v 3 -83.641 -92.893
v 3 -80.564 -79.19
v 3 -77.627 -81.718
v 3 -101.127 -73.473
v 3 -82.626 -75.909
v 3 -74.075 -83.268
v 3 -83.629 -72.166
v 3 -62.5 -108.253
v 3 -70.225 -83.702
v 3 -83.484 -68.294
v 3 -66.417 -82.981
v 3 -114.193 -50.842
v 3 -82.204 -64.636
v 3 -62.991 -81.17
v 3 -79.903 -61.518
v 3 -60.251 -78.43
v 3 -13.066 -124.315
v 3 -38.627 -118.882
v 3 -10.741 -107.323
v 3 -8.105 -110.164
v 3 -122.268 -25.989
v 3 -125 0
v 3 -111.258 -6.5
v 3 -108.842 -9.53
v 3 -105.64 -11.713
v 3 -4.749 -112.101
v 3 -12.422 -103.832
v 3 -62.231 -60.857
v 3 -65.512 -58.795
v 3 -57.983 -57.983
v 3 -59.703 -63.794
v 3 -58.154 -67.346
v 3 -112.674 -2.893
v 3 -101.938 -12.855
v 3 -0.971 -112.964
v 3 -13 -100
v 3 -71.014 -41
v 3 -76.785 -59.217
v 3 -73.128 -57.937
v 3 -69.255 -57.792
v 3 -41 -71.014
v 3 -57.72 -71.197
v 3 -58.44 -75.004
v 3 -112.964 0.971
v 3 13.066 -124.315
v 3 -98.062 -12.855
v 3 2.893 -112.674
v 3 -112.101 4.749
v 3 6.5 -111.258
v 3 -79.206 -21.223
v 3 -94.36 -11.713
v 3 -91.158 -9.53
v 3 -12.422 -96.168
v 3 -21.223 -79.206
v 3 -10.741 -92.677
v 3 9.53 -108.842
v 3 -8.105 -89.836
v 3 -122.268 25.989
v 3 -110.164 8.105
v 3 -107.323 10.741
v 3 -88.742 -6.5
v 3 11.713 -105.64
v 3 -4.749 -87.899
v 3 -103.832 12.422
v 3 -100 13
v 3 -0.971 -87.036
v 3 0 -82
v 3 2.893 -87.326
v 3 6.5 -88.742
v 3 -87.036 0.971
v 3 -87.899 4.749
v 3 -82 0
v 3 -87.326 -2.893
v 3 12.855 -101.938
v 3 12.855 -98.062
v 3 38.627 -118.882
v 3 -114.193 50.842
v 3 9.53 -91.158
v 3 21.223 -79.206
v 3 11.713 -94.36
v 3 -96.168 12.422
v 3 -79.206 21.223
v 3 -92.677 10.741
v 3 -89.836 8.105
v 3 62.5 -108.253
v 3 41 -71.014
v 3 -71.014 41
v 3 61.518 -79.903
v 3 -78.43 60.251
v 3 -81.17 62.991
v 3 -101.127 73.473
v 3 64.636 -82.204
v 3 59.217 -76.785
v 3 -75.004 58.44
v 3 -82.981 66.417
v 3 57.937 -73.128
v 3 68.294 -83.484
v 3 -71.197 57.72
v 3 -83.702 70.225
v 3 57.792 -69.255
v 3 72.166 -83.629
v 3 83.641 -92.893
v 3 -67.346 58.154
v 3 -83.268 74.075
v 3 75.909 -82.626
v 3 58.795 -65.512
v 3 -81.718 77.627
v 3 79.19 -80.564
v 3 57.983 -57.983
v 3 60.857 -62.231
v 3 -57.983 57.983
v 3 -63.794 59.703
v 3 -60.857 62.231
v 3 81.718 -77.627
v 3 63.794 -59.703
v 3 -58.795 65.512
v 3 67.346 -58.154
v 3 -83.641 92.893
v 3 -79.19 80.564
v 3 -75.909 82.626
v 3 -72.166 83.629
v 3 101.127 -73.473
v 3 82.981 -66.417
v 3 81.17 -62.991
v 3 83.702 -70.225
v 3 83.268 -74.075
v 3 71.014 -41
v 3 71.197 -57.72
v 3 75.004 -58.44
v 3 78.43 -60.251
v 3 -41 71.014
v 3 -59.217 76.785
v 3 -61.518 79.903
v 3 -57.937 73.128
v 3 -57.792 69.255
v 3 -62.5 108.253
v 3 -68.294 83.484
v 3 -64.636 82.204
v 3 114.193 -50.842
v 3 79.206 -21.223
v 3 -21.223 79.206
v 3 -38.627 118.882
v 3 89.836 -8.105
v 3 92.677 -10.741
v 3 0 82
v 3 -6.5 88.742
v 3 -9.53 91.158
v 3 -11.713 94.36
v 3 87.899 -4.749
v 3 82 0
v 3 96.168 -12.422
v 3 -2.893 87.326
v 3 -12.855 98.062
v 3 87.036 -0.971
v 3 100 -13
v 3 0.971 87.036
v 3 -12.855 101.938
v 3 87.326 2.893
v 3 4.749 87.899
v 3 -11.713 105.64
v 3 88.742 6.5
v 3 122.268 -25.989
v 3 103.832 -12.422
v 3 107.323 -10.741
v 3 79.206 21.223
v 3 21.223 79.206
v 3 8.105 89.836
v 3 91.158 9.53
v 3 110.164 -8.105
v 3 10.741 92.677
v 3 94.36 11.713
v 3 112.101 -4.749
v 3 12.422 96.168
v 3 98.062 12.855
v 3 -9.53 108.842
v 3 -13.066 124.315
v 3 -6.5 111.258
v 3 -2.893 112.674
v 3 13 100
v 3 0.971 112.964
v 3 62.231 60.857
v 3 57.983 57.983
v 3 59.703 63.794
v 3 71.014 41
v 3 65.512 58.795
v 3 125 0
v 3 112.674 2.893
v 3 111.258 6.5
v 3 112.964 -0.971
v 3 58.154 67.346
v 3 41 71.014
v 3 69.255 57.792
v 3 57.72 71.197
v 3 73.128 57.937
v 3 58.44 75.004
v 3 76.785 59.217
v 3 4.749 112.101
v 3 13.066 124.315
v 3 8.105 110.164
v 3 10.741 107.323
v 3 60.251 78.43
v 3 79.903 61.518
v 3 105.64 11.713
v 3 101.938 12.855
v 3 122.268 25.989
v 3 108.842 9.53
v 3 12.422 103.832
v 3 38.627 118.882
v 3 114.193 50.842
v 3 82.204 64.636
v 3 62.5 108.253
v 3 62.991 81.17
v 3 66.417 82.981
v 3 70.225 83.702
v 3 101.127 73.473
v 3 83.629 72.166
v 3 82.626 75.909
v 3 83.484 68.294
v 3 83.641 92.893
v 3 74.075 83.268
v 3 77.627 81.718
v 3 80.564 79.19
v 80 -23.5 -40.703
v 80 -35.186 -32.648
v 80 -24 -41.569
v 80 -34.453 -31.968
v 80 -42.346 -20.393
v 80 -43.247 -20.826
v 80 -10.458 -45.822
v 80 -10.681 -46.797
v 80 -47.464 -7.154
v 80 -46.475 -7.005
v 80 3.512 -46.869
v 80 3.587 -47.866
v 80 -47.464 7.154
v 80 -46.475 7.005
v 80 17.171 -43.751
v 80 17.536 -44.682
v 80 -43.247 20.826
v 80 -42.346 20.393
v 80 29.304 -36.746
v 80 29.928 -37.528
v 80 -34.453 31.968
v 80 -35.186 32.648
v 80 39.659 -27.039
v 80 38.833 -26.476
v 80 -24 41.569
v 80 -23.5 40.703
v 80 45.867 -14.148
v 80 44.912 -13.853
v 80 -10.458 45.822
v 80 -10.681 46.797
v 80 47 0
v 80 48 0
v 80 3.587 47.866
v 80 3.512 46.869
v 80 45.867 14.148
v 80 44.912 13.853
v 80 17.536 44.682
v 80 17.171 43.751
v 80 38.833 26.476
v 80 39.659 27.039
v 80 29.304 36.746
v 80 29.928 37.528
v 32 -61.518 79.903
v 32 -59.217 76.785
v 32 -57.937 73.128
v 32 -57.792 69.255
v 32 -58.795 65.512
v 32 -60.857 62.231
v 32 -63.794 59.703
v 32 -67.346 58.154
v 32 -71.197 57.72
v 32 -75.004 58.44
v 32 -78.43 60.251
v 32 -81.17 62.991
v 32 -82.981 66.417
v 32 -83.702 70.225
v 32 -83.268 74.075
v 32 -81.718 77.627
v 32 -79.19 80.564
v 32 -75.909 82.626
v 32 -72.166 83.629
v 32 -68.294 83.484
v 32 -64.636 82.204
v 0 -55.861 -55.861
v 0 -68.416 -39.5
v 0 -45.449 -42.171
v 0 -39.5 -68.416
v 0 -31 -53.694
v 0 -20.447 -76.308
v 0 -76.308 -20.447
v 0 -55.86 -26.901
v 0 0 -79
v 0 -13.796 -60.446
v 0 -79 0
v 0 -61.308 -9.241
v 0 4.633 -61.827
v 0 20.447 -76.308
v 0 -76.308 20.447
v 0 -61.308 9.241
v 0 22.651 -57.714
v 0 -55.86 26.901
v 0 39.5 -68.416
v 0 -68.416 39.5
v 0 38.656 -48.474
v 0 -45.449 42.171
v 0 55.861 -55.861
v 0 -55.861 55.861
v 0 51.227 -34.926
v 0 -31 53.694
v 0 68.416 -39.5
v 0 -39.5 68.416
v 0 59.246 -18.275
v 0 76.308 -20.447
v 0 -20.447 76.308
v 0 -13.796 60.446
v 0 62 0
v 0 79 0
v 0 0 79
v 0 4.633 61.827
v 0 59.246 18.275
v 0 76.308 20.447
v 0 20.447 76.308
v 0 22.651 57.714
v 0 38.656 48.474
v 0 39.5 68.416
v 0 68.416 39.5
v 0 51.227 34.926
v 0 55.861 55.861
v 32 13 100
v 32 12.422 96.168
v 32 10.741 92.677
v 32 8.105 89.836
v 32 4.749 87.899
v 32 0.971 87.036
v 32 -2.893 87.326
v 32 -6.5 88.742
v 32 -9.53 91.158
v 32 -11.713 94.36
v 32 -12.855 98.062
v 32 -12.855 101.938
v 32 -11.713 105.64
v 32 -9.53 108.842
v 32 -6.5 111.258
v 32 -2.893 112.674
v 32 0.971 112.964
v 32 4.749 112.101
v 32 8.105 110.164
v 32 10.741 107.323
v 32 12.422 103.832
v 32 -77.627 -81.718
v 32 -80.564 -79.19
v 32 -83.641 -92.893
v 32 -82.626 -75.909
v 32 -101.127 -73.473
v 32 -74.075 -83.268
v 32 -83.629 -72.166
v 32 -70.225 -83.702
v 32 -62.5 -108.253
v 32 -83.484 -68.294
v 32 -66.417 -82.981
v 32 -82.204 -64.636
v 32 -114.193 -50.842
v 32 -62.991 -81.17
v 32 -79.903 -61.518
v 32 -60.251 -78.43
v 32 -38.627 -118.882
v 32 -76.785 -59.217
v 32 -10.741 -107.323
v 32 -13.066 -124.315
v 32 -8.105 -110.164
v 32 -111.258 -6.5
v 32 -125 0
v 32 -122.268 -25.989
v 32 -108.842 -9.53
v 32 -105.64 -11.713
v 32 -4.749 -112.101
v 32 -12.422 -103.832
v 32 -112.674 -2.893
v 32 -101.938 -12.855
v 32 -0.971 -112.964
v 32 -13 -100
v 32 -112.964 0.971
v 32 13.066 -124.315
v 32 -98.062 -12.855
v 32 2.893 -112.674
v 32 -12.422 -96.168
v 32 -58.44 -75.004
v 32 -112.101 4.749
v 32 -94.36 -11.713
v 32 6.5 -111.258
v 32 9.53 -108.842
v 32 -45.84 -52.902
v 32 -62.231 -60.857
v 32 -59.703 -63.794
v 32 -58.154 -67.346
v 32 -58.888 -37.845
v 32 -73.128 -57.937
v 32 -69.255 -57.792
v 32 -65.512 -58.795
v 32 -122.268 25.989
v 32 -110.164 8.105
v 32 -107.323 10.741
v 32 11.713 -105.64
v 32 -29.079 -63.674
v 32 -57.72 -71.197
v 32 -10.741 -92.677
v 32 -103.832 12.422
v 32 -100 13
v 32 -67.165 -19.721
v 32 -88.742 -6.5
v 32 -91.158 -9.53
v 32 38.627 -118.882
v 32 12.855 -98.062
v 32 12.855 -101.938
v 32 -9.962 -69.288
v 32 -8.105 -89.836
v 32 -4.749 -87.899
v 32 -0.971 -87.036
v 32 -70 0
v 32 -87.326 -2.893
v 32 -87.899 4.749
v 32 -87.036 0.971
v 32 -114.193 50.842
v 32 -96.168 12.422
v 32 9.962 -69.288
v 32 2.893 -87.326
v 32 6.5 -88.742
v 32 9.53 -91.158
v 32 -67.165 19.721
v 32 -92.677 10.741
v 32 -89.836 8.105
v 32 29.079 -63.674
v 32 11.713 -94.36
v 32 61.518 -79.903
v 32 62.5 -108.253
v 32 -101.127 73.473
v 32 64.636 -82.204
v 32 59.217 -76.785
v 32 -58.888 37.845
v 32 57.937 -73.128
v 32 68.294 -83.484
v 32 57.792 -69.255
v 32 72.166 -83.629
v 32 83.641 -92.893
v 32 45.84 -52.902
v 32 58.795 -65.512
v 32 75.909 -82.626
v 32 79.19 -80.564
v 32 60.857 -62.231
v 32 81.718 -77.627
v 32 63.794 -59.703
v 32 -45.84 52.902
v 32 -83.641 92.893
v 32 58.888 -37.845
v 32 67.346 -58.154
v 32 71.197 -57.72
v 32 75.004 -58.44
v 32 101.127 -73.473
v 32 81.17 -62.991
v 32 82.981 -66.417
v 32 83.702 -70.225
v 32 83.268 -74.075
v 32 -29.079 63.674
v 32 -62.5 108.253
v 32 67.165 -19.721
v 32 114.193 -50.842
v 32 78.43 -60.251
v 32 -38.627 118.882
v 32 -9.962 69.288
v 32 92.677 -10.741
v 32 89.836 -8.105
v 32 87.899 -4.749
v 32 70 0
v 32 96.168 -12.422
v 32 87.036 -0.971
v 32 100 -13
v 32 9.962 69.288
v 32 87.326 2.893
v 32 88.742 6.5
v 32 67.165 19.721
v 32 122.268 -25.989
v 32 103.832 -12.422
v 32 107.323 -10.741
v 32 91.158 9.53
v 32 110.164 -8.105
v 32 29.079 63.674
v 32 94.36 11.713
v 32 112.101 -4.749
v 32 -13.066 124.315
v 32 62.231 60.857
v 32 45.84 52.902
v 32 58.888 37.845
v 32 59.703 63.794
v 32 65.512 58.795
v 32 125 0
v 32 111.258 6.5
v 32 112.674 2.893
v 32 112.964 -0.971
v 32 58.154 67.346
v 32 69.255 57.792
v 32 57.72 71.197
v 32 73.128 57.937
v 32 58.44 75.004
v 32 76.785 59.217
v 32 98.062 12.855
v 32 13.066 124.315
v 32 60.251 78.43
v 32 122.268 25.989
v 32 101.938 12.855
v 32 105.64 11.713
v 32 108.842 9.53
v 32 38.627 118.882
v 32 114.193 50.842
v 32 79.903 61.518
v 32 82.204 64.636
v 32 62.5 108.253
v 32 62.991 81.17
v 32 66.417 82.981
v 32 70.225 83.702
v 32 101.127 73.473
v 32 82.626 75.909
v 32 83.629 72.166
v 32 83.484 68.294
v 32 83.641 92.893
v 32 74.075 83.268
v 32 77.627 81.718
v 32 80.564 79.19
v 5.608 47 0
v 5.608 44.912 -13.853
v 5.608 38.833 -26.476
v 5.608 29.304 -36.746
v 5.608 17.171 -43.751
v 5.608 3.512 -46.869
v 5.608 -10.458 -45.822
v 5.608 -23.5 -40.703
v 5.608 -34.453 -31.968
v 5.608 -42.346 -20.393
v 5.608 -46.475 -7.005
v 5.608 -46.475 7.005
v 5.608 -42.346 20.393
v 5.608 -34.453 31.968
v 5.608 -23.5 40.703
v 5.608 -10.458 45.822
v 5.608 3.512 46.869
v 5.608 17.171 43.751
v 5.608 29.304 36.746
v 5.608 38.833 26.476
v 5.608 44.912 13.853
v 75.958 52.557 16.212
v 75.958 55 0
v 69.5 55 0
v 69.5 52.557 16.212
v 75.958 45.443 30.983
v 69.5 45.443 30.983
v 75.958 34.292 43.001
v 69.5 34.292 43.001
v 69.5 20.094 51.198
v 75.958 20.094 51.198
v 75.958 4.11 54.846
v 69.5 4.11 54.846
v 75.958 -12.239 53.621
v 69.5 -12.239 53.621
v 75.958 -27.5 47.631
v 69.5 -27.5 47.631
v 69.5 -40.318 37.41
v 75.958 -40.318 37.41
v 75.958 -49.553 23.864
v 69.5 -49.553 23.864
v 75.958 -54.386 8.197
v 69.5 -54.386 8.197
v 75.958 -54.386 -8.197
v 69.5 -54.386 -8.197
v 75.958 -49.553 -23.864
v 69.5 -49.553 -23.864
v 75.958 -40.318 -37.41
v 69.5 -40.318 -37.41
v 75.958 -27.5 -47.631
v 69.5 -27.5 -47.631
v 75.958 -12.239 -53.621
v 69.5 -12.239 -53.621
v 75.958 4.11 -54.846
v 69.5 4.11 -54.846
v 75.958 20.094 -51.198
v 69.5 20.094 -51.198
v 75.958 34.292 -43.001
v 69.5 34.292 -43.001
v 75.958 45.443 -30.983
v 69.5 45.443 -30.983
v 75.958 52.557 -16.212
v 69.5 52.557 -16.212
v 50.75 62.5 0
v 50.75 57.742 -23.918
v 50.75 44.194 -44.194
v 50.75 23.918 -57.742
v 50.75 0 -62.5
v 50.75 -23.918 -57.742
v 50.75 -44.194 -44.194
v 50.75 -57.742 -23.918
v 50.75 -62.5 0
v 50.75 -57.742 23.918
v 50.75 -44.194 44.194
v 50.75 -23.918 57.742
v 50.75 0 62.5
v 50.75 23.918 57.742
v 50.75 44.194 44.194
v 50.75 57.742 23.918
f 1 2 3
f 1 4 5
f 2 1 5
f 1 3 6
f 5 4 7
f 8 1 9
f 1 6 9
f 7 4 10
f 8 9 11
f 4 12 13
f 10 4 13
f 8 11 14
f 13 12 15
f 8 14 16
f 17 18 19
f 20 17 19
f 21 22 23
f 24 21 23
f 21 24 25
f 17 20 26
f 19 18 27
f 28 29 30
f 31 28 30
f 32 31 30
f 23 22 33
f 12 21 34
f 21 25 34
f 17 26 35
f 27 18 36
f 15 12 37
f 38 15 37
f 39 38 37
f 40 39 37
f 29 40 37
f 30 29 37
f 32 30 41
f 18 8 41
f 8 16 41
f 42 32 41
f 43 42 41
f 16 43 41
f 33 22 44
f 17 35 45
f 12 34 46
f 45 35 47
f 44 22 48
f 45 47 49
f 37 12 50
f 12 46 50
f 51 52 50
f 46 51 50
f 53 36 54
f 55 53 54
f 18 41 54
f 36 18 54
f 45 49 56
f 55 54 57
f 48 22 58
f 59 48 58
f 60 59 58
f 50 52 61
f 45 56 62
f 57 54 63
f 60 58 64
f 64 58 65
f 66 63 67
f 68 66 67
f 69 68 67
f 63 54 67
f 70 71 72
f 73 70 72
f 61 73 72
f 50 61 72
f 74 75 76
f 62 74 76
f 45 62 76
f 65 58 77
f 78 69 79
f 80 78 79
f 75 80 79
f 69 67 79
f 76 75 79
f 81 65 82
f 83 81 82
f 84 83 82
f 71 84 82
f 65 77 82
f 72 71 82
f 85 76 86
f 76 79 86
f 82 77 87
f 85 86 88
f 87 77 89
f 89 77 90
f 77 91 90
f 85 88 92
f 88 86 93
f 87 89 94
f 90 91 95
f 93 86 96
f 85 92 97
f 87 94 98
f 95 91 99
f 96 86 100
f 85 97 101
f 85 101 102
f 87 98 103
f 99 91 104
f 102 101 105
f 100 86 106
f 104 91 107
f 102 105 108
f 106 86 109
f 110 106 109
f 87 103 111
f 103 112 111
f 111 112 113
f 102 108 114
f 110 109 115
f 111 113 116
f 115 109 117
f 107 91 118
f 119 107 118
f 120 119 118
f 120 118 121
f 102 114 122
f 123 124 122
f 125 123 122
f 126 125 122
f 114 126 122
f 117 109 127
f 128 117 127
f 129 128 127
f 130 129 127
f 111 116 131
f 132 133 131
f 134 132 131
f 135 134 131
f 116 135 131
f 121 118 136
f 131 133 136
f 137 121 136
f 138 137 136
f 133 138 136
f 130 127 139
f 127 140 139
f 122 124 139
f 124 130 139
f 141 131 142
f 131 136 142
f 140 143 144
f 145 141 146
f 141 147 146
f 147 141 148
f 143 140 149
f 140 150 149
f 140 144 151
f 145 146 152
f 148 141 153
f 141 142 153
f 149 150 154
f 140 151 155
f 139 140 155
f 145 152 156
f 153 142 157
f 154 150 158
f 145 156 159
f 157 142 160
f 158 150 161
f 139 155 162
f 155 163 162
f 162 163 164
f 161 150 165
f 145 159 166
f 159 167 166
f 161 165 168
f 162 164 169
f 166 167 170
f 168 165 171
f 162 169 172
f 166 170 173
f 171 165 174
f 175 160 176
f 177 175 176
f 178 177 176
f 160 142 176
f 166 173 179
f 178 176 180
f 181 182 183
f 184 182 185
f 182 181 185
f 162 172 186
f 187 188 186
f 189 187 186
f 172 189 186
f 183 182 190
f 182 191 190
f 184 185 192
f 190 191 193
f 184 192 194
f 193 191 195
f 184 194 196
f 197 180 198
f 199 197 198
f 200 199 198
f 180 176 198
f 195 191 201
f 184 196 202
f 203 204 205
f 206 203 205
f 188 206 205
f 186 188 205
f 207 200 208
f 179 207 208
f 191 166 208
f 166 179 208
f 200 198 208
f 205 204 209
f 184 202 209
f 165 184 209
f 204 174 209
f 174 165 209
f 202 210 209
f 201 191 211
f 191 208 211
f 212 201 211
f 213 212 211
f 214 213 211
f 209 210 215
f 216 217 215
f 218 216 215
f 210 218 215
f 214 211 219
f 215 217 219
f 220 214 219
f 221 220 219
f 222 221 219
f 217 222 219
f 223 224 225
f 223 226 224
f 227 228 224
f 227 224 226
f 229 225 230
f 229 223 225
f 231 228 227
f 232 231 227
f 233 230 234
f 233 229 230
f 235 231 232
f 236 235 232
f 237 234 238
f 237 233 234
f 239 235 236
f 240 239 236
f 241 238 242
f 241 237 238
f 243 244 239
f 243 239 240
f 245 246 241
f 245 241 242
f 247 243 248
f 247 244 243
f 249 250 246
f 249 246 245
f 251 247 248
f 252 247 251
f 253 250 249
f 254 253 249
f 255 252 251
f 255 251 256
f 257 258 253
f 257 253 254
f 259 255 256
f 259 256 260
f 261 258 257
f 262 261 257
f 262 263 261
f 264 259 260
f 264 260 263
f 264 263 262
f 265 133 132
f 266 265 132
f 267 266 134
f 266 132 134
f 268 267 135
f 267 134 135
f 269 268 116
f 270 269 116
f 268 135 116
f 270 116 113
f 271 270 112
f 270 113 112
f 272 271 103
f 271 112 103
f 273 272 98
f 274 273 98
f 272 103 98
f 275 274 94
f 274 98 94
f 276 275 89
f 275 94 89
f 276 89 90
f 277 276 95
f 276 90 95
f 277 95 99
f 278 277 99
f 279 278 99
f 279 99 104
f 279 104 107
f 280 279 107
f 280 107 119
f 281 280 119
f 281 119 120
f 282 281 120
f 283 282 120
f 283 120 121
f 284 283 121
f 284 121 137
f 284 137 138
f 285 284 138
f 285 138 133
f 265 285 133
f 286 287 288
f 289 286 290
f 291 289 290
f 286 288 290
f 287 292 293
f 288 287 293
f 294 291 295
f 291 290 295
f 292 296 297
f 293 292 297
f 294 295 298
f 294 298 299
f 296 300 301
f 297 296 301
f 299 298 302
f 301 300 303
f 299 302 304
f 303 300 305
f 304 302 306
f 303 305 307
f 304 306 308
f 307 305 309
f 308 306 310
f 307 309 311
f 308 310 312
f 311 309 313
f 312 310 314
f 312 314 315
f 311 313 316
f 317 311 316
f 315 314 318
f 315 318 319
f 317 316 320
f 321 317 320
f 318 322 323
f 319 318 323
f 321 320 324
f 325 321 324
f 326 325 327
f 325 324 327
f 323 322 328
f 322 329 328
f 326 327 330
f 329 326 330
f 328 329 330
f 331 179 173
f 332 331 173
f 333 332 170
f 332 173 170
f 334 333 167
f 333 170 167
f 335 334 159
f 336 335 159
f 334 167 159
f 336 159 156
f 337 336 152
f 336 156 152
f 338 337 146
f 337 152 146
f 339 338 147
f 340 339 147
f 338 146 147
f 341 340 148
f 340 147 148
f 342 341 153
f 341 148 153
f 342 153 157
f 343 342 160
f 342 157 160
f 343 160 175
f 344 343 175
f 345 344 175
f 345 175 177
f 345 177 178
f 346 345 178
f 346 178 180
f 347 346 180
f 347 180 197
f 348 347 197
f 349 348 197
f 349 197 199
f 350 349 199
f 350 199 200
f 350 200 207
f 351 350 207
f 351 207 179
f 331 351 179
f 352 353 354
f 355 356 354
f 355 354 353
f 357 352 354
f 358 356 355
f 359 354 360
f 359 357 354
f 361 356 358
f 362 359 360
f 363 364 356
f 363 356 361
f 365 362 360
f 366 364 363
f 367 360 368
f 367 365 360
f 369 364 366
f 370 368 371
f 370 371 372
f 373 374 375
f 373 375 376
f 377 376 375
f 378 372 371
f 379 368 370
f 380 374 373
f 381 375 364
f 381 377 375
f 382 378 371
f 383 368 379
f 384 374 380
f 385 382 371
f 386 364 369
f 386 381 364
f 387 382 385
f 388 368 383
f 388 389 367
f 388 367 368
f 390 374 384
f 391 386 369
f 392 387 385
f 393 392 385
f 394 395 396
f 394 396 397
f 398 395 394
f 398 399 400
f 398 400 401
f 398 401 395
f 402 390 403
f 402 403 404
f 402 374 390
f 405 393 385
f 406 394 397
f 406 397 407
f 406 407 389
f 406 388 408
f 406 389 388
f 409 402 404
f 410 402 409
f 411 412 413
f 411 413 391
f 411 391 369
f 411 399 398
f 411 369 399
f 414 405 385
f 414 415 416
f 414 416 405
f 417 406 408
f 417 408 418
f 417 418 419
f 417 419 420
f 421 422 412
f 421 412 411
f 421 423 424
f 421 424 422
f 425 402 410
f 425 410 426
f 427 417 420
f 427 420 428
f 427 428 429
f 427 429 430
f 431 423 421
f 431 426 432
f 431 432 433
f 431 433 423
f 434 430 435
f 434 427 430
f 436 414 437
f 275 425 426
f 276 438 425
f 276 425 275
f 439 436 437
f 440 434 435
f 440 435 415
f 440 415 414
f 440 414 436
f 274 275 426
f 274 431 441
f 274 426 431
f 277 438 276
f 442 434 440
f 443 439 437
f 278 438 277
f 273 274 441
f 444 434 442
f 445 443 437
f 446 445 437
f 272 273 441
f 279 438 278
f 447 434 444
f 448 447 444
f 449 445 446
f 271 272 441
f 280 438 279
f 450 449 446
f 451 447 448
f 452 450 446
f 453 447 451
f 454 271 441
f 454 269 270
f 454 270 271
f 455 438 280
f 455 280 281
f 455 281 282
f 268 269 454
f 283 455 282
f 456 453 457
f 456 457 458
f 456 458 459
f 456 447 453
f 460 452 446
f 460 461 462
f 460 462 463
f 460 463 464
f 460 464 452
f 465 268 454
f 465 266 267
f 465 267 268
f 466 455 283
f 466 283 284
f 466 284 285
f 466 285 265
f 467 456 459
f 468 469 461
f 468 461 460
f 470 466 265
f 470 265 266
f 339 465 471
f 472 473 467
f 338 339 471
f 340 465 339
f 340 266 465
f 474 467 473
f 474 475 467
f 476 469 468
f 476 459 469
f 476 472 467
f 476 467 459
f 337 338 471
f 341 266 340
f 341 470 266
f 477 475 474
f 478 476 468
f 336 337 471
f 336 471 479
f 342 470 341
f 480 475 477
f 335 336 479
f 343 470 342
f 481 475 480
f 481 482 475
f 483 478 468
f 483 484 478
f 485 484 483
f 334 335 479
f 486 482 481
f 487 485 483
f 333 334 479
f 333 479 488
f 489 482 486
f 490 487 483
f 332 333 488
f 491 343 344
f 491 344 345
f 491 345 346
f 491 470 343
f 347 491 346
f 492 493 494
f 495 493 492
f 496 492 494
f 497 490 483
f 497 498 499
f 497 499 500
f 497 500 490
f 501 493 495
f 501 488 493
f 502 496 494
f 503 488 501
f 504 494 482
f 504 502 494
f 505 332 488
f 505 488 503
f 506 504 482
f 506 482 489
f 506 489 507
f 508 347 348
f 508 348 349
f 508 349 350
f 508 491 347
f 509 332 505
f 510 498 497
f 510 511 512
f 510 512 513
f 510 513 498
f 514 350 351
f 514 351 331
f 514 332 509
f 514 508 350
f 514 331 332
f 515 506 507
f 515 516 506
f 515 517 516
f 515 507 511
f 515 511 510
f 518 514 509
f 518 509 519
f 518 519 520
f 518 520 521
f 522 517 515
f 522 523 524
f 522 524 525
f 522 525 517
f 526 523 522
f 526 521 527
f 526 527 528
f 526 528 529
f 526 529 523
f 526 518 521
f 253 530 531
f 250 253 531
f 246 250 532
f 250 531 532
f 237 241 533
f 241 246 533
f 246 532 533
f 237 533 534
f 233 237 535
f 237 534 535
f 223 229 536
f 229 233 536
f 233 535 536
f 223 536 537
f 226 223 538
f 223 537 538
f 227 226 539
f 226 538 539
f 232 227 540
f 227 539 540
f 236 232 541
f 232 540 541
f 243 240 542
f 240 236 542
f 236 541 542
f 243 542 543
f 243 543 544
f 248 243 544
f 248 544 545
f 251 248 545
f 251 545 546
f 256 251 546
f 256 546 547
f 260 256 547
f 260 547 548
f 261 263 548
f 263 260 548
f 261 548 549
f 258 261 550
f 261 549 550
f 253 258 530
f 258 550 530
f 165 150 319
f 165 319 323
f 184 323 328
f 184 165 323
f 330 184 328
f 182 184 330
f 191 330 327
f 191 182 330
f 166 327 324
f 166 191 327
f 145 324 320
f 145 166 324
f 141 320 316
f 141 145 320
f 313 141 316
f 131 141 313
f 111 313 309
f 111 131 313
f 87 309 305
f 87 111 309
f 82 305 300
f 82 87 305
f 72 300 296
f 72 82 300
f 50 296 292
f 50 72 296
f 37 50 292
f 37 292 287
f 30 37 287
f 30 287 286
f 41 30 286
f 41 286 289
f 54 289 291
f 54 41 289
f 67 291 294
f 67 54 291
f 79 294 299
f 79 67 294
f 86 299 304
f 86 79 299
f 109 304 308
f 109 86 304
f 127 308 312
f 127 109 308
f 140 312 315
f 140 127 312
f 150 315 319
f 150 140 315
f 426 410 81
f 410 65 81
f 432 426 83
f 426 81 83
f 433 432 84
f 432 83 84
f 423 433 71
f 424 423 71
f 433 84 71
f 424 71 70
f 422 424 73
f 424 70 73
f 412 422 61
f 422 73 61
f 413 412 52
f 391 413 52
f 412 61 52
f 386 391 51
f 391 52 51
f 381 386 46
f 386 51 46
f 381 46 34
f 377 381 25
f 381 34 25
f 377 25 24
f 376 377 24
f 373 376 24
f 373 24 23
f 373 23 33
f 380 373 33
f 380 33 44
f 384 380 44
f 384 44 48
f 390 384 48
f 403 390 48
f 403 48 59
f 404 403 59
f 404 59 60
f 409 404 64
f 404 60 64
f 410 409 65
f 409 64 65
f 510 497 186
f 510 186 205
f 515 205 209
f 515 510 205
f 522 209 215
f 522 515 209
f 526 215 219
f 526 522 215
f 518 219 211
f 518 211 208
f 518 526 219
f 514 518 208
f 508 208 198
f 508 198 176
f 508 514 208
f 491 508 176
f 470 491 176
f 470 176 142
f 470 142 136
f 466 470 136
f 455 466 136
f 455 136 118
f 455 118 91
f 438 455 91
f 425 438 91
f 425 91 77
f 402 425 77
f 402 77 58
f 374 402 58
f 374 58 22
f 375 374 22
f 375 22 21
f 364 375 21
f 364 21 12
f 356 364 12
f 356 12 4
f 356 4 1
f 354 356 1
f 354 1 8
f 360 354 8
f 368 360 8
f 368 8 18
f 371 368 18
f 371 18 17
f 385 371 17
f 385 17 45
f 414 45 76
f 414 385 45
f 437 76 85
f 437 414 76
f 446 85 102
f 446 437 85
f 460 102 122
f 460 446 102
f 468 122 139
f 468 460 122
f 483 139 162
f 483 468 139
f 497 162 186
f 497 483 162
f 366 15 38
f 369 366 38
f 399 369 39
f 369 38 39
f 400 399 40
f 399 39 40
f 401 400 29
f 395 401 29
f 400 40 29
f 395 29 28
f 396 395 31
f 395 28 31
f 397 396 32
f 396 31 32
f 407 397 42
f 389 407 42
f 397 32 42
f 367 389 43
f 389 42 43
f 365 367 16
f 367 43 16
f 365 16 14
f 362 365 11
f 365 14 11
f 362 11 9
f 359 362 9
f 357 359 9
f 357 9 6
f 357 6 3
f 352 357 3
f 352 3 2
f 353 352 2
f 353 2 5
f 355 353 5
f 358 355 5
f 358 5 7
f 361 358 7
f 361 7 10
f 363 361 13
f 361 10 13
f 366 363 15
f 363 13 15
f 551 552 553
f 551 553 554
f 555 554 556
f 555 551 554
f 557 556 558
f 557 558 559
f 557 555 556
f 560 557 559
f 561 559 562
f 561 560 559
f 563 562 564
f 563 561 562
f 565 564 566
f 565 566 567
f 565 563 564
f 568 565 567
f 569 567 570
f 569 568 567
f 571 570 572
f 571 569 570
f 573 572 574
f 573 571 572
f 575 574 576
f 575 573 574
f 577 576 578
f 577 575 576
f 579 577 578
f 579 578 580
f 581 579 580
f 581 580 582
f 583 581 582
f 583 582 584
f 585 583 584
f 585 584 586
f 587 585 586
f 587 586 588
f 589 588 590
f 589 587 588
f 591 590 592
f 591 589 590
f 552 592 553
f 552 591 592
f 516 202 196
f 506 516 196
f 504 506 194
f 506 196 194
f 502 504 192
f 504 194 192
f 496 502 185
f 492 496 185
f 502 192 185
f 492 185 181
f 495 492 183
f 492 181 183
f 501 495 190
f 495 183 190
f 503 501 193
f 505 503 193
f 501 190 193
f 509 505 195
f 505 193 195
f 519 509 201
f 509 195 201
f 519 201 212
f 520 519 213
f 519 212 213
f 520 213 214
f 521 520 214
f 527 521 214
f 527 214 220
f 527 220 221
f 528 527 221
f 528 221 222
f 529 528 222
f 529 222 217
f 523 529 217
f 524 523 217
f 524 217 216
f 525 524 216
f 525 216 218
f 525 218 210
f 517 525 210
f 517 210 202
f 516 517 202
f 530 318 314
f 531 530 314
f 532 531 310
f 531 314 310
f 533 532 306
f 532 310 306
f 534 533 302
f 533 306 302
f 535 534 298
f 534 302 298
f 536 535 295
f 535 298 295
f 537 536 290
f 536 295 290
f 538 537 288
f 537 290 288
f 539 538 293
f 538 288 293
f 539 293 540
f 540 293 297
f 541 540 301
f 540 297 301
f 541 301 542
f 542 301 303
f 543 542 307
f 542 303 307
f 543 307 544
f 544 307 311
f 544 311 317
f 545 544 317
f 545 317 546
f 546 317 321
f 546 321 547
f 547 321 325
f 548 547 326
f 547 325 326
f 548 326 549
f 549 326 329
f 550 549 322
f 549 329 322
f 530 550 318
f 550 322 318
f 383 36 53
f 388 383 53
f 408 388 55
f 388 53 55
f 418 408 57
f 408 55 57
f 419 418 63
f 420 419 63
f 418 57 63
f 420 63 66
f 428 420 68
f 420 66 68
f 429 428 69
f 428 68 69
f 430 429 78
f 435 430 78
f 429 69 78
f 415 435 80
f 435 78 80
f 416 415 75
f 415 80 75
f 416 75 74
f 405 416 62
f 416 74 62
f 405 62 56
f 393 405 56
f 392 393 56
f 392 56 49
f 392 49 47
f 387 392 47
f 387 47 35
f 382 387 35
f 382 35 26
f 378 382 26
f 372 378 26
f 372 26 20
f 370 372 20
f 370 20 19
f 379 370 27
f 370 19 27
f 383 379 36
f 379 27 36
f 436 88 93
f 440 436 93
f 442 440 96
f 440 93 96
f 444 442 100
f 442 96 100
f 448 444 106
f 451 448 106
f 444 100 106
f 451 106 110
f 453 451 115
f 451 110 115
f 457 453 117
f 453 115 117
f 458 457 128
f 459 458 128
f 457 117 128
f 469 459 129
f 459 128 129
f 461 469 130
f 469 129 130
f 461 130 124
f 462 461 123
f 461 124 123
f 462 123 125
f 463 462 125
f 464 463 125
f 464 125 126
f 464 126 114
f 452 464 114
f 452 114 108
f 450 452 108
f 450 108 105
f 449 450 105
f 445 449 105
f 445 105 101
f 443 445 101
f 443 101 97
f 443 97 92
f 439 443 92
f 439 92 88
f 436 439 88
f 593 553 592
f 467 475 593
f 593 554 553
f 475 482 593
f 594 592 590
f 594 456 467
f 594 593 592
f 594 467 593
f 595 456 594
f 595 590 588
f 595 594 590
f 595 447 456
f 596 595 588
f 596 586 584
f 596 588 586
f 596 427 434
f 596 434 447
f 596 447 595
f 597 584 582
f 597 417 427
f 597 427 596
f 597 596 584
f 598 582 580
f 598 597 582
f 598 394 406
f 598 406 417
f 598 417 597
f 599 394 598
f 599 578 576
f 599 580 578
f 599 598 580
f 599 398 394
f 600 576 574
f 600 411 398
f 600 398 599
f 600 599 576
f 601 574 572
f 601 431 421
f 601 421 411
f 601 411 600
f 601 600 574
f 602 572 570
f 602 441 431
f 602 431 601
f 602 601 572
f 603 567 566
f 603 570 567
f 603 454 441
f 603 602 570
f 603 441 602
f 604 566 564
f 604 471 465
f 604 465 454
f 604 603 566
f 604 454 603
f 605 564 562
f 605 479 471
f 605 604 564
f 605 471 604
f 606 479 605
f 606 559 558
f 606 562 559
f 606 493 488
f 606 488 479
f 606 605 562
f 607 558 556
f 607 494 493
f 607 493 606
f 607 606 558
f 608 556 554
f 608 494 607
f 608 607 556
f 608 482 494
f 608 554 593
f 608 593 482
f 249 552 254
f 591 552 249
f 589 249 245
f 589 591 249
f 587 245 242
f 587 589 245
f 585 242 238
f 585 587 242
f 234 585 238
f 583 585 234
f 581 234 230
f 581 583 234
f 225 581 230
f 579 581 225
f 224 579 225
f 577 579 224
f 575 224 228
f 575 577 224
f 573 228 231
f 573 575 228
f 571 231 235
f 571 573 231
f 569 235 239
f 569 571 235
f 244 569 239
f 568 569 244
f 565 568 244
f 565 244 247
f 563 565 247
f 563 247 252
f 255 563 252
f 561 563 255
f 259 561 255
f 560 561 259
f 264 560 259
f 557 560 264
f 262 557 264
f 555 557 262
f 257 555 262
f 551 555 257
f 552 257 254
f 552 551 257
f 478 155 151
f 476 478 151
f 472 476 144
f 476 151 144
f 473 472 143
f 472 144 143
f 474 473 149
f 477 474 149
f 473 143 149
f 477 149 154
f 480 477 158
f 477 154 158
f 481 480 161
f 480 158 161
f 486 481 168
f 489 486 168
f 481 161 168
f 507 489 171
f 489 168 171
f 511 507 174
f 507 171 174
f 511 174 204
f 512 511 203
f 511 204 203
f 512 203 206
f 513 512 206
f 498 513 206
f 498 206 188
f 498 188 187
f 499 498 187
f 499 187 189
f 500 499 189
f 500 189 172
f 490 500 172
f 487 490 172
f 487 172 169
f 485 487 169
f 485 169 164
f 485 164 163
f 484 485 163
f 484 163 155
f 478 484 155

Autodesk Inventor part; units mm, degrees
ref_plane "YZ Plane" through (0, 0, 0) normal (1, 0, 0) x (0, 1, 0)
ref_plane "XZ Plane" through (0, 0, 0) normal (0, 1, 0) x (-1, 0, 0)
ref_plane "XY Plane" through (0, 0, 0) normal (0, 0, 1) x (1, 0, 0)
sketch "Sketch1" plane through (0, 0, 0) normal (0, 0, 1) x (1, 0, 0)
  line L0 (3, 125) -> (32, 125)
  line L1 (32, 125) -> (32, 70)
  line L2 (3, 82) -> (3, 125)
  line L3 (-16, 0) -> (96, 0) projected
  line L4 (32, 70) -> (69.5, 55)
  line L5 (69.5, 55) -> (75.9585, 55)
  line L6 (80, 48) -> (80, 47)
  line L7 (80, 47) -> (5.6083, 47)
  line L8 (3, 82) -> (0, 79)
  line L9 (0, 79) -> (0, 62)
  line L10 (80, 48) -> (75.9585, 55)
  line L11 (5.6083, 47) -> (0, 62)
  point P0 (0, 0)
  point P1 (80, 55)
  dimension "d0" = 29
  dimension "d1" = 250
  dimension "d7" = 94
  dimension "d8" = 158
  dimension "d9" = 140
  dimension "d10" = 135
  dimension "d11" = 3
  dimension "d19" = 15
  dimension "d12" = 37.5
  dimension "d13" = 110
  dimension "d14" = 77
  dimension "d15" = 30
  dimension "d16" = 1
  dimension "d17" = 20.5
  dimension "d18" = 124
revolve "Revolution1" add sketch "Sketch1" angle 360 about axis through (-10, 0, 0) along (1, 0, 0)
sketch "Sketch2" plane through (0, 0, 0) normal (1, 0, 0) x (0, 1, 0)
  circle A0 centre (0, 100) radius 13
  line L0 (0, 44.8) -> (0, 25.2) construction
  line L1 (-9.8, 0) -> (9.8, 0) construction
  dimension "d2" = 26
  dimension "d3" = 200
extrude "Extrusion1" cut sketch "Sketch2" along normal through all both and the other way through all
pattern_circular "Circular Pattern1" count 8 over 360 about axis through (-10, 0, 0) along (1, 0, 0) of "Extrusion1"
equation "\"d2\" = d"
equation "\"d3\" = D1_"
equation "\"d0\" = b"
equation "\"d1\" = D_"
equation "\"d7\" = d1__"
equation "\"d8\" = D2_"
equation "\"d9\" = Dm"
equation "\"d11\" = h_"
equation "\"d12\" = 2.5 * d19"
equation "\"d13\" = Dn"
equation "\"d14\" = h4_"
equation "\"d18\" = D7_"
equation "\"b\" = 29"
equation "\"Dm\" = 140"
equation "\"D_\" = 250"
equation "\"D1_\" = 200"
equation "\"D2_\" = 158"
equation "\"d\" = 26"
equation "\"h_\" = 3"
equation "\"d1__\" = 94"
equation "\"h4_\" = 77"
equation "\"Dn\" = 110"
equation "\"D7_\" = 124"
properties part number "Flange 6-100-63 GOST 12821-80" material "Steel, Mild"
